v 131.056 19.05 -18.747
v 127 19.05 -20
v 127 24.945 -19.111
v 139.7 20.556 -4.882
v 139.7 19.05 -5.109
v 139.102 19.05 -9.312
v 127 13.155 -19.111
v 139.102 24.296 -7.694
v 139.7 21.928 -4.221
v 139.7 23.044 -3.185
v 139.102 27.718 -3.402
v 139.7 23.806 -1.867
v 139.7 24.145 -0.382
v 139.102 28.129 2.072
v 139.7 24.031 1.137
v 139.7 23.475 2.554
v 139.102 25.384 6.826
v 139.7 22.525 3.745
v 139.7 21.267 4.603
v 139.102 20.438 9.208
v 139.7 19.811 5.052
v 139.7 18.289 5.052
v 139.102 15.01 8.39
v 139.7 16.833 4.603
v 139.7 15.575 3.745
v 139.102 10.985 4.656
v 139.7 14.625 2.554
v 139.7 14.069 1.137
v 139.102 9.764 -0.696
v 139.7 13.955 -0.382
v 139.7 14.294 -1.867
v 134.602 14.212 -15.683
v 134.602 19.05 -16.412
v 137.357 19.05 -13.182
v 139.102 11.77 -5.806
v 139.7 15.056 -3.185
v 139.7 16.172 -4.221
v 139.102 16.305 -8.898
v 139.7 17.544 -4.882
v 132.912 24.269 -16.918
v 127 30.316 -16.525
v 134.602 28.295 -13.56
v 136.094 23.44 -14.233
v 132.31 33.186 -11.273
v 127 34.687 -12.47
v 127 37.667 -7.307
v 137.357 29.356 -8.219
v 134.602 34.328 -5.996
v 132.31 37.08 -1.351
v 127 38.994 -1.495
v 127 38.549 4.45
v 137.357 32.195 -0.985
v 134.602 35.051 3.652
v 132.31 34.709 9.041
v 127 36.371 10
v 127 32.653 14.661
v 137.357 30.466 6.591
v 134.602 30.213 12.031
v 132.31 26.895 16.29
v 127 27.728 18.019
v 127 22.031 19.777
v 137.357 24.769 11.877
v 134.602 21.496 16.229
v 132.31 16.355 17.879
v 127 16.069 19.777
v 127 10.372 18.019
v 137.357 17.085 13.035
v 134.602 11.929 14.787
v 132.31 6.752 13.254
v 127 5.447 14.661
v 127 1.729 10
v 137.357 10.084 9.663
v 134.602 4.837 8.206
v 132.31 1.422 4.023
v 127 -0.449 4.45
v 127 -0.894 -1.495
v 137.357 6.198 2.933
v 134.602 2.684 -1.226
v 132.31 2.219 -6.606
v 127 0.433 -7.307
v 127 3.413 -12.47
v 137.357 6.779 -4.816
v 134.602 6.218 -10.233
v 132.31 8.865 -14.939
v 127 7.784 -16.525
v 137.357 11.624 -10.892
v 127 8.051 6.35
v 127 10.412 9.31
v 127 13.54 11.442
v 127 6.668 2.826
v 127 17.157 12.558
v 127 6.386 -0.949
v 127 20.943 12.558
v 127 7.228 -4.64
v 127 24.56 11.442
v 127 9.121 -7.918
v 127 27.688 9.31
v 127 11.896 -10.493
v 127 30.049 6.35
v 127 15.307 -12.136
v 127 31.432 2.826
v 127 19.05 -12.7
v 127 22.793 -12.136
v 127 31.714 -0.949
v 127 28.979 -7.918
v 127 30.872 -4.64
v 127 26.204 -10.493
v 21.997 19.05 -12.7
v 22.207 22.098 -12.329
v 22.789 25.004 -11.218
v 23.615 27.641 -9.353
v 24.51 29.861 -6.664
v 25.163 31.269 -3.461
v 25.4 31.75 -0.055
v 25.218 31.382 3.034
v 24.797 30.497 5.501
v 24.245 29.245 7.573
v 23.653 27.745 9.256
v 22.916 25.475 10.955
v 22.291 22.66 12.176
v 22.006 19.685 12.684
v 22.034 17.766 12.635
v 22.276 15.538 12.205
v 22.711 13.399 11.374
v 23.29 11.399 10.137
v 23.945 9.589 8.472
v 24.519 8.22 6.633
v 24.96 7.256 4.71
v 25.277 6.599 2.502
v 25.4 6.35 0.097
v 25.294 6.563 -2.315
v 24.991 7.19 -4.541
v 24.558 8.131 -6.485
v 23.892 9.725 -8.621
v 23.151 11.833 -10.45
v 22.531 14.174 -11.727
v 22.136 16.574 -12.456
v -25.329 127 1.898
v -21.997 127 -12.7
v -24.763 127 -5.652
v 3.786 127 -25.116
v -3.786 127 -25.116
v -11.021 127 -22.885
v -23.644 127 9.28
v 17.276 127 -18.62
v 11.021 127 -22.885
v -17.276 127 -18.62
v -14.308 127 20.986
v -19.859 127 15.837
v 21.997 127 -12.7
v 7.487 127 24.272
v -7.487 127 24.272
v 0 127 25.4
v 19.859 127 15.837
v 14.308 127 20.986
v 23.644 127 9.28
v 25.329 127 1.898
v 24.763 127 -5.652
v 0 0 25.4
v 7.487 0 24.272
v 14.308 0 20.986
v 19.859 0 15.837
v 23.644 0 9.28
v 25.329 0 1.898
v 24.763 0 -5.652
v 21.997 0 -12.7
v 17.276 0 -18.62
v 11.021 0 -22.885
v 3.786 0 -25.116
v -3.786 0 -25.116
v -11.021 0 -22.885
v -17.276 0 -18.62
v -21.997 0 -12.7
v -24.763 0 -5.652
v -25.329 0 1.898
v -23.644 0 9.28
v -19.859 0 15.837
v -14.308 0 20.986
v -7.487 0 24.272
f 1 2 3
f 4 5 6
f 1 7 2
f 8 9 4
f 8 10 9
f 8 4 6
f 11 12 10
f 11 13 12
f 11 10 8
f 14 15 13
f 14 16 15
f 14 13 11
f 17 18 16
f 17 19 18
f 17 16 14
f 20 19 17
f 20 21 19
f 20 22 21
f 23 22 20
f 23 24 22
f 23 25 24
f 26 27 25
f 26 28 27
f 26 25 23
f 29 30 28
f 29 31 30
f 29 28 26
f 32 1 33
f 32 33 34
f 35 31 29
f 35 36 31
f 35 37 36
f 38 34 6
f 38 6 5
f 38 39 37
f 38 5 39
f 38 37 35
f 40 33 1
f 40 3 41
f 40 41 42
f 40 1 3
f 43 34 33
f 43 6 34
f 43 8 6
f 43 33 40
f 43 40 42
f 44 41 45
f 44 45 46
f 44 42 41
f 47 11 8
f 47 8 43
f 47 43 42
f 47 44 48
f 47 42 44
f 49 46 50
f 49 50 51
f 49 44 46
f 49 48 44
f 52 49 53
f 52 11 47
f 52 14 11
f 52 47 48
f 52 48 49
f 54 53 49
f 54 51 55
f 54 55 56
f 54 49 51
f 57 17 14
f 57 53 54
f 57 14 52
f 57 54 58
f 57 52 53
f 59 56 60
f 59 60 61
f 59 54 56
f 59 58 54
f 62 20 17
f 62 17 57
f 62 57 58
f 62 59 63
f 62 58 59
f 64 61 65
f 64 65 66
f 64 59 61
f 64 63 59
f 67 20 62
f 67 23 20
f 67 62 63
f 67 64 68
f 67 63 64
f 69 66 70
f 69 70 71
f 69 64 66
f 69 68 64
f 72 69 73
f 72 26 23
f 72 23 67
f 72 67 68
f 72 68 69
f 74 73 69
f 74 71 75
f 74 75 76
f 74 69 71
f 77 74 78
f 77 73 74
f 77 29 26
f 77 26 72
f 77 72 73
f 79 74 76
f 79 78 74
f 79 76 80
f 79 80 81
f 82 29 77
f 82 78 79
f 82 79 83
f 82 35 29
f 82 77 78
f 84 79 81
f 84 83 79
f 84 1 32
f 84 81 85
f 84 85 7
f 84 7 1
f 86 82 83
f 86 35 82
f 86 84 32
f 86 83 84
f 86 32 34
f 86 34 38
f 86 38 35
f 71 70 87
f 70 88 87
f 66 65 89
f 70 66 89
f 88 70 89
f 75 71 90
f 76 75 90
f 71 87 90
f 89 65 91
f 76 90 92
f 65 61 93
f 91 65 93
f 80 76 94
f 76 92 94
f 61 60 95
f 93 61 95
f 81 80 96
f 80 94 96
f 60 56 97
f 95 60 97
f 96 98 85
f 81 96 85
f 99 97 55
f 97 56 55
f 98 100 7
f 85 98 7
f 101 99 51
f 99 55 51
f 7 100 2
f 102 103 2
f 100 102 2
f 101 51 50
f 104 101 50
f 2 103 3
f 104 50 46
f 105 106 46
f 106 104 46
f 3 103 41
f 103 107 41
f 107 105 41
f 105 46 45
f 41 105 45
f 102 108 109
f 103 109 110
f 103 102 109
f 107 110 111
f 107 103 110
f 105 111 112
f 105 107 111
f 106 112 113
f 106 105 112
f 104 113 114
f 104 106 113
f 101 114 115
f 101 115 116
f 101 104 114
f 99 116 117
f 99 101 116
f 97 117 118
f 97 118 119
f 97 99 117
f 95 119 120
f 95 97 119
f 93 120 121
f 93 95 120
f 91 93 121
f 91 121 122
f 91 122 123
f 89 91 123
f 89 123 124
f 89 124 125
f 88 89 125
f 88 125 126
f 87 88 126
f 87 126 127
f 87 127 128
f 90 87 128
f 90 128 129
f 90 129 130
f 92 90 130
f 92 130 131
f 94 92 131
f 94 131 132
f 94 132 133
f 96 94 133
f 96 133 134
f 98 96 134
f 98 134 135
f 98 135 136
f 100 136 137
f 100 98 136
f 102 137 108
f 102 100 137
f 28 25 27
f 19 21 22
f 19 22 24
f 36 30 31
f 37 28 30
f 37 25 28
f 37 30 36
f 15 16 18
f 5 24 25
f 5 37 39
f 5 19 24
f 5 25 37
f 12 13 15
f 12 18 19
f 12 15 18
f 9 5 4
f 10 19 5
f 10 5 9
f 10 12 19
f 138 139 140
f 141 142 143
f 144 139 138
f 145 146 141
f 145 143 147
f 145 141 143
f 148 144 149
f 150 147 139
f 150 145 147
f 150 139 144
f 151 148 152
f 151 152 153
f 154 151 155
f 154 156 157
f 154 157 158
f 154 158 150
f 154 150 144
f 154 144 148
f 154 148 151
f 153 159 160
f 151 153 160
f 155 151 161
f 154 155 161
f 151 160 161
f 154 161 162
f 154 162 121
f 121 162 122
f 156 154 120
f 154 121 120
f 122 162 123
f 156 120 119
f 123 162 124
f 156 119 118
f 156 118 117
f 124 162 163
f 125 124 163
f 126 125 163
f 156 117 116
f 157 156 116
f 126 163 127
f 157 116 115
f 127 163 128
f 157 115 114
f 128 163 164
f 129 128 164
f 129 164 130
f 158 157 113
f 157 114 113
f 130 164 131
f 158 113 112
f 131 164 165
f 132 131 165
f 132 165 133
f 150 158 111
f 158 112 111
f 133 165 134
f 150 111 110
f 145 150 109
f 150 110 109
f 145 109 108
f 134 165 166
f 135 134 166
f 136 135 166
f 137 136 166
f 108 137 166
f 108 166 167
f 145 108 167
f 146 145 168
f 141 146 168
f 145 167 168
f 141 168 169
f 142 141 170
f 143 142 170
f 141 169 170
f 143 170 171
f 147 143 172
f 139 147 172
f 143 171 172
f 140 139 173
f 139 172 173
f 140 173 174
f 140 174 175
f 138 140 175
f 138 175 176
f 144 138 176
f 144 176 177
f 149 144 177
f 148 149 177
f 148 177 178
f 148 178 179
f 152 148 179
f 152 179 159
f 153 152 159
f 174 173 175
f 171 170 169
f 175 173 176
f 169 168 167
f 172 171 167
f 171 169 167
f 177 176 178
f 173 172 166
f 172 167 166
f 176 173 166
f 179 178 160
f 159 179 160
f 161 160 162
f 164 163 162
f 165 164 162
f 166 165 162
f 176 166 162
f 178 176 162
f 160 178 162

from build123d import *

# Parameters (mm, degrees)
SKETCH1_R                = 25.4
BOSS_EXTRUDE1_DEPTH      = 127
BOSS_EXTRUDE2_REACH      = 202
BOSS_EXTRUDE2_END_RADIUS = 25.4
SKETCH3_R                = 12.7
SKETCH4_R                = 20
BOSS_EXTRUDE3_DEPTH      = 12.7
FILLET1_R                = 15.08


with BuildPart() as part:
    # Sketch1 → Boss-Extrude1 (new body)
    with BuildSketch(Plane(origin=(0, 0, 0), x_dir=(1, 0, 0), z_dir=(0, 1, 0))):
        with Locations(Location((0, 0, 0), (0, 0, 270))):
            Circle(SKETCH1_R)
    extrude(amount=BOSS_EXTRUDE1_DEPTH)

    # Boss-Extrude2: up to this cylinder (the profile starts outside it)
    boss_extrude2_end = Plane(origin=(0, 19.05, 0), z_dir=(0, -1, 0)) * Cylinder(BOSS_EXTRUDE2_END_RADIUS, 455.8, mode=Mode.PRIVATE)
    # Sketch3 → Boss-Extrude2 (add, up to the surface)
    with BuildSketch(Plane(origin=(127, 0, 0), x_dir=(0, 0, -1), z_dir=(1, 0, 0)), mode=Mode.PRIVATE) as boss_extrude2_sk1:
        with Locations((0, 19.05)):
            Circle(SKETCH3_R)
    boss_extrude2_tool1 = extrude(boss_extrude2_sk1.sketch, amount=-BOSS_EXTRUDE2_REACH, mode=Mode.PRIVATE) - boss_extrude2_end
    add(boss_extrude2_tool1.solids().sort_by_distance((127, 19.05, 0))[0])

    # Sketch4 → Boss-Extrude3 (add)
    with BuildSketch(Plane(origin=(127, 0, 0), x_dir=(0, 0, -1), z_dir=(1, 0, 0))):
        with Locations((0, 19.05)):
            Circle(SKETCH4_R)
    extrude(amount=BOSS_EXTRUDE3_DEPTH)

    # Fillet1
    # the kernel refuses this fillet: 15.08 mm, written as the material it takes off along each edge
    with BuildSketch(Plane(origin=(139.7, 19.05, 0), x_dir=(0, 0, -1), z_dir=(0, -1, 0))) as fillet1_piece_1:
        with BuildLine():
            CenterArc((5.108996004, -15.08), FILLET1_R, 9.080670078, 80.919329922)
            Line((5.108996004, 0), (5.108996004, 0.3016))
            Line((5.108996004, 0.3016), (20, 0.3016))
            Line((20, 0.3016), (20.3016, 0))
            ThreePointArc((20.3016, 0), (20.3016, -6.35), (20.29782008, -12.6524))
            Line((20.29782008, -12.6524), (20, -12.7))
        make_face()
    revolve(axis=Axis((139.7, 19.05, 0), (1, 0, 0)), mode=Mode.SUBTRACT)


solid = part.part
